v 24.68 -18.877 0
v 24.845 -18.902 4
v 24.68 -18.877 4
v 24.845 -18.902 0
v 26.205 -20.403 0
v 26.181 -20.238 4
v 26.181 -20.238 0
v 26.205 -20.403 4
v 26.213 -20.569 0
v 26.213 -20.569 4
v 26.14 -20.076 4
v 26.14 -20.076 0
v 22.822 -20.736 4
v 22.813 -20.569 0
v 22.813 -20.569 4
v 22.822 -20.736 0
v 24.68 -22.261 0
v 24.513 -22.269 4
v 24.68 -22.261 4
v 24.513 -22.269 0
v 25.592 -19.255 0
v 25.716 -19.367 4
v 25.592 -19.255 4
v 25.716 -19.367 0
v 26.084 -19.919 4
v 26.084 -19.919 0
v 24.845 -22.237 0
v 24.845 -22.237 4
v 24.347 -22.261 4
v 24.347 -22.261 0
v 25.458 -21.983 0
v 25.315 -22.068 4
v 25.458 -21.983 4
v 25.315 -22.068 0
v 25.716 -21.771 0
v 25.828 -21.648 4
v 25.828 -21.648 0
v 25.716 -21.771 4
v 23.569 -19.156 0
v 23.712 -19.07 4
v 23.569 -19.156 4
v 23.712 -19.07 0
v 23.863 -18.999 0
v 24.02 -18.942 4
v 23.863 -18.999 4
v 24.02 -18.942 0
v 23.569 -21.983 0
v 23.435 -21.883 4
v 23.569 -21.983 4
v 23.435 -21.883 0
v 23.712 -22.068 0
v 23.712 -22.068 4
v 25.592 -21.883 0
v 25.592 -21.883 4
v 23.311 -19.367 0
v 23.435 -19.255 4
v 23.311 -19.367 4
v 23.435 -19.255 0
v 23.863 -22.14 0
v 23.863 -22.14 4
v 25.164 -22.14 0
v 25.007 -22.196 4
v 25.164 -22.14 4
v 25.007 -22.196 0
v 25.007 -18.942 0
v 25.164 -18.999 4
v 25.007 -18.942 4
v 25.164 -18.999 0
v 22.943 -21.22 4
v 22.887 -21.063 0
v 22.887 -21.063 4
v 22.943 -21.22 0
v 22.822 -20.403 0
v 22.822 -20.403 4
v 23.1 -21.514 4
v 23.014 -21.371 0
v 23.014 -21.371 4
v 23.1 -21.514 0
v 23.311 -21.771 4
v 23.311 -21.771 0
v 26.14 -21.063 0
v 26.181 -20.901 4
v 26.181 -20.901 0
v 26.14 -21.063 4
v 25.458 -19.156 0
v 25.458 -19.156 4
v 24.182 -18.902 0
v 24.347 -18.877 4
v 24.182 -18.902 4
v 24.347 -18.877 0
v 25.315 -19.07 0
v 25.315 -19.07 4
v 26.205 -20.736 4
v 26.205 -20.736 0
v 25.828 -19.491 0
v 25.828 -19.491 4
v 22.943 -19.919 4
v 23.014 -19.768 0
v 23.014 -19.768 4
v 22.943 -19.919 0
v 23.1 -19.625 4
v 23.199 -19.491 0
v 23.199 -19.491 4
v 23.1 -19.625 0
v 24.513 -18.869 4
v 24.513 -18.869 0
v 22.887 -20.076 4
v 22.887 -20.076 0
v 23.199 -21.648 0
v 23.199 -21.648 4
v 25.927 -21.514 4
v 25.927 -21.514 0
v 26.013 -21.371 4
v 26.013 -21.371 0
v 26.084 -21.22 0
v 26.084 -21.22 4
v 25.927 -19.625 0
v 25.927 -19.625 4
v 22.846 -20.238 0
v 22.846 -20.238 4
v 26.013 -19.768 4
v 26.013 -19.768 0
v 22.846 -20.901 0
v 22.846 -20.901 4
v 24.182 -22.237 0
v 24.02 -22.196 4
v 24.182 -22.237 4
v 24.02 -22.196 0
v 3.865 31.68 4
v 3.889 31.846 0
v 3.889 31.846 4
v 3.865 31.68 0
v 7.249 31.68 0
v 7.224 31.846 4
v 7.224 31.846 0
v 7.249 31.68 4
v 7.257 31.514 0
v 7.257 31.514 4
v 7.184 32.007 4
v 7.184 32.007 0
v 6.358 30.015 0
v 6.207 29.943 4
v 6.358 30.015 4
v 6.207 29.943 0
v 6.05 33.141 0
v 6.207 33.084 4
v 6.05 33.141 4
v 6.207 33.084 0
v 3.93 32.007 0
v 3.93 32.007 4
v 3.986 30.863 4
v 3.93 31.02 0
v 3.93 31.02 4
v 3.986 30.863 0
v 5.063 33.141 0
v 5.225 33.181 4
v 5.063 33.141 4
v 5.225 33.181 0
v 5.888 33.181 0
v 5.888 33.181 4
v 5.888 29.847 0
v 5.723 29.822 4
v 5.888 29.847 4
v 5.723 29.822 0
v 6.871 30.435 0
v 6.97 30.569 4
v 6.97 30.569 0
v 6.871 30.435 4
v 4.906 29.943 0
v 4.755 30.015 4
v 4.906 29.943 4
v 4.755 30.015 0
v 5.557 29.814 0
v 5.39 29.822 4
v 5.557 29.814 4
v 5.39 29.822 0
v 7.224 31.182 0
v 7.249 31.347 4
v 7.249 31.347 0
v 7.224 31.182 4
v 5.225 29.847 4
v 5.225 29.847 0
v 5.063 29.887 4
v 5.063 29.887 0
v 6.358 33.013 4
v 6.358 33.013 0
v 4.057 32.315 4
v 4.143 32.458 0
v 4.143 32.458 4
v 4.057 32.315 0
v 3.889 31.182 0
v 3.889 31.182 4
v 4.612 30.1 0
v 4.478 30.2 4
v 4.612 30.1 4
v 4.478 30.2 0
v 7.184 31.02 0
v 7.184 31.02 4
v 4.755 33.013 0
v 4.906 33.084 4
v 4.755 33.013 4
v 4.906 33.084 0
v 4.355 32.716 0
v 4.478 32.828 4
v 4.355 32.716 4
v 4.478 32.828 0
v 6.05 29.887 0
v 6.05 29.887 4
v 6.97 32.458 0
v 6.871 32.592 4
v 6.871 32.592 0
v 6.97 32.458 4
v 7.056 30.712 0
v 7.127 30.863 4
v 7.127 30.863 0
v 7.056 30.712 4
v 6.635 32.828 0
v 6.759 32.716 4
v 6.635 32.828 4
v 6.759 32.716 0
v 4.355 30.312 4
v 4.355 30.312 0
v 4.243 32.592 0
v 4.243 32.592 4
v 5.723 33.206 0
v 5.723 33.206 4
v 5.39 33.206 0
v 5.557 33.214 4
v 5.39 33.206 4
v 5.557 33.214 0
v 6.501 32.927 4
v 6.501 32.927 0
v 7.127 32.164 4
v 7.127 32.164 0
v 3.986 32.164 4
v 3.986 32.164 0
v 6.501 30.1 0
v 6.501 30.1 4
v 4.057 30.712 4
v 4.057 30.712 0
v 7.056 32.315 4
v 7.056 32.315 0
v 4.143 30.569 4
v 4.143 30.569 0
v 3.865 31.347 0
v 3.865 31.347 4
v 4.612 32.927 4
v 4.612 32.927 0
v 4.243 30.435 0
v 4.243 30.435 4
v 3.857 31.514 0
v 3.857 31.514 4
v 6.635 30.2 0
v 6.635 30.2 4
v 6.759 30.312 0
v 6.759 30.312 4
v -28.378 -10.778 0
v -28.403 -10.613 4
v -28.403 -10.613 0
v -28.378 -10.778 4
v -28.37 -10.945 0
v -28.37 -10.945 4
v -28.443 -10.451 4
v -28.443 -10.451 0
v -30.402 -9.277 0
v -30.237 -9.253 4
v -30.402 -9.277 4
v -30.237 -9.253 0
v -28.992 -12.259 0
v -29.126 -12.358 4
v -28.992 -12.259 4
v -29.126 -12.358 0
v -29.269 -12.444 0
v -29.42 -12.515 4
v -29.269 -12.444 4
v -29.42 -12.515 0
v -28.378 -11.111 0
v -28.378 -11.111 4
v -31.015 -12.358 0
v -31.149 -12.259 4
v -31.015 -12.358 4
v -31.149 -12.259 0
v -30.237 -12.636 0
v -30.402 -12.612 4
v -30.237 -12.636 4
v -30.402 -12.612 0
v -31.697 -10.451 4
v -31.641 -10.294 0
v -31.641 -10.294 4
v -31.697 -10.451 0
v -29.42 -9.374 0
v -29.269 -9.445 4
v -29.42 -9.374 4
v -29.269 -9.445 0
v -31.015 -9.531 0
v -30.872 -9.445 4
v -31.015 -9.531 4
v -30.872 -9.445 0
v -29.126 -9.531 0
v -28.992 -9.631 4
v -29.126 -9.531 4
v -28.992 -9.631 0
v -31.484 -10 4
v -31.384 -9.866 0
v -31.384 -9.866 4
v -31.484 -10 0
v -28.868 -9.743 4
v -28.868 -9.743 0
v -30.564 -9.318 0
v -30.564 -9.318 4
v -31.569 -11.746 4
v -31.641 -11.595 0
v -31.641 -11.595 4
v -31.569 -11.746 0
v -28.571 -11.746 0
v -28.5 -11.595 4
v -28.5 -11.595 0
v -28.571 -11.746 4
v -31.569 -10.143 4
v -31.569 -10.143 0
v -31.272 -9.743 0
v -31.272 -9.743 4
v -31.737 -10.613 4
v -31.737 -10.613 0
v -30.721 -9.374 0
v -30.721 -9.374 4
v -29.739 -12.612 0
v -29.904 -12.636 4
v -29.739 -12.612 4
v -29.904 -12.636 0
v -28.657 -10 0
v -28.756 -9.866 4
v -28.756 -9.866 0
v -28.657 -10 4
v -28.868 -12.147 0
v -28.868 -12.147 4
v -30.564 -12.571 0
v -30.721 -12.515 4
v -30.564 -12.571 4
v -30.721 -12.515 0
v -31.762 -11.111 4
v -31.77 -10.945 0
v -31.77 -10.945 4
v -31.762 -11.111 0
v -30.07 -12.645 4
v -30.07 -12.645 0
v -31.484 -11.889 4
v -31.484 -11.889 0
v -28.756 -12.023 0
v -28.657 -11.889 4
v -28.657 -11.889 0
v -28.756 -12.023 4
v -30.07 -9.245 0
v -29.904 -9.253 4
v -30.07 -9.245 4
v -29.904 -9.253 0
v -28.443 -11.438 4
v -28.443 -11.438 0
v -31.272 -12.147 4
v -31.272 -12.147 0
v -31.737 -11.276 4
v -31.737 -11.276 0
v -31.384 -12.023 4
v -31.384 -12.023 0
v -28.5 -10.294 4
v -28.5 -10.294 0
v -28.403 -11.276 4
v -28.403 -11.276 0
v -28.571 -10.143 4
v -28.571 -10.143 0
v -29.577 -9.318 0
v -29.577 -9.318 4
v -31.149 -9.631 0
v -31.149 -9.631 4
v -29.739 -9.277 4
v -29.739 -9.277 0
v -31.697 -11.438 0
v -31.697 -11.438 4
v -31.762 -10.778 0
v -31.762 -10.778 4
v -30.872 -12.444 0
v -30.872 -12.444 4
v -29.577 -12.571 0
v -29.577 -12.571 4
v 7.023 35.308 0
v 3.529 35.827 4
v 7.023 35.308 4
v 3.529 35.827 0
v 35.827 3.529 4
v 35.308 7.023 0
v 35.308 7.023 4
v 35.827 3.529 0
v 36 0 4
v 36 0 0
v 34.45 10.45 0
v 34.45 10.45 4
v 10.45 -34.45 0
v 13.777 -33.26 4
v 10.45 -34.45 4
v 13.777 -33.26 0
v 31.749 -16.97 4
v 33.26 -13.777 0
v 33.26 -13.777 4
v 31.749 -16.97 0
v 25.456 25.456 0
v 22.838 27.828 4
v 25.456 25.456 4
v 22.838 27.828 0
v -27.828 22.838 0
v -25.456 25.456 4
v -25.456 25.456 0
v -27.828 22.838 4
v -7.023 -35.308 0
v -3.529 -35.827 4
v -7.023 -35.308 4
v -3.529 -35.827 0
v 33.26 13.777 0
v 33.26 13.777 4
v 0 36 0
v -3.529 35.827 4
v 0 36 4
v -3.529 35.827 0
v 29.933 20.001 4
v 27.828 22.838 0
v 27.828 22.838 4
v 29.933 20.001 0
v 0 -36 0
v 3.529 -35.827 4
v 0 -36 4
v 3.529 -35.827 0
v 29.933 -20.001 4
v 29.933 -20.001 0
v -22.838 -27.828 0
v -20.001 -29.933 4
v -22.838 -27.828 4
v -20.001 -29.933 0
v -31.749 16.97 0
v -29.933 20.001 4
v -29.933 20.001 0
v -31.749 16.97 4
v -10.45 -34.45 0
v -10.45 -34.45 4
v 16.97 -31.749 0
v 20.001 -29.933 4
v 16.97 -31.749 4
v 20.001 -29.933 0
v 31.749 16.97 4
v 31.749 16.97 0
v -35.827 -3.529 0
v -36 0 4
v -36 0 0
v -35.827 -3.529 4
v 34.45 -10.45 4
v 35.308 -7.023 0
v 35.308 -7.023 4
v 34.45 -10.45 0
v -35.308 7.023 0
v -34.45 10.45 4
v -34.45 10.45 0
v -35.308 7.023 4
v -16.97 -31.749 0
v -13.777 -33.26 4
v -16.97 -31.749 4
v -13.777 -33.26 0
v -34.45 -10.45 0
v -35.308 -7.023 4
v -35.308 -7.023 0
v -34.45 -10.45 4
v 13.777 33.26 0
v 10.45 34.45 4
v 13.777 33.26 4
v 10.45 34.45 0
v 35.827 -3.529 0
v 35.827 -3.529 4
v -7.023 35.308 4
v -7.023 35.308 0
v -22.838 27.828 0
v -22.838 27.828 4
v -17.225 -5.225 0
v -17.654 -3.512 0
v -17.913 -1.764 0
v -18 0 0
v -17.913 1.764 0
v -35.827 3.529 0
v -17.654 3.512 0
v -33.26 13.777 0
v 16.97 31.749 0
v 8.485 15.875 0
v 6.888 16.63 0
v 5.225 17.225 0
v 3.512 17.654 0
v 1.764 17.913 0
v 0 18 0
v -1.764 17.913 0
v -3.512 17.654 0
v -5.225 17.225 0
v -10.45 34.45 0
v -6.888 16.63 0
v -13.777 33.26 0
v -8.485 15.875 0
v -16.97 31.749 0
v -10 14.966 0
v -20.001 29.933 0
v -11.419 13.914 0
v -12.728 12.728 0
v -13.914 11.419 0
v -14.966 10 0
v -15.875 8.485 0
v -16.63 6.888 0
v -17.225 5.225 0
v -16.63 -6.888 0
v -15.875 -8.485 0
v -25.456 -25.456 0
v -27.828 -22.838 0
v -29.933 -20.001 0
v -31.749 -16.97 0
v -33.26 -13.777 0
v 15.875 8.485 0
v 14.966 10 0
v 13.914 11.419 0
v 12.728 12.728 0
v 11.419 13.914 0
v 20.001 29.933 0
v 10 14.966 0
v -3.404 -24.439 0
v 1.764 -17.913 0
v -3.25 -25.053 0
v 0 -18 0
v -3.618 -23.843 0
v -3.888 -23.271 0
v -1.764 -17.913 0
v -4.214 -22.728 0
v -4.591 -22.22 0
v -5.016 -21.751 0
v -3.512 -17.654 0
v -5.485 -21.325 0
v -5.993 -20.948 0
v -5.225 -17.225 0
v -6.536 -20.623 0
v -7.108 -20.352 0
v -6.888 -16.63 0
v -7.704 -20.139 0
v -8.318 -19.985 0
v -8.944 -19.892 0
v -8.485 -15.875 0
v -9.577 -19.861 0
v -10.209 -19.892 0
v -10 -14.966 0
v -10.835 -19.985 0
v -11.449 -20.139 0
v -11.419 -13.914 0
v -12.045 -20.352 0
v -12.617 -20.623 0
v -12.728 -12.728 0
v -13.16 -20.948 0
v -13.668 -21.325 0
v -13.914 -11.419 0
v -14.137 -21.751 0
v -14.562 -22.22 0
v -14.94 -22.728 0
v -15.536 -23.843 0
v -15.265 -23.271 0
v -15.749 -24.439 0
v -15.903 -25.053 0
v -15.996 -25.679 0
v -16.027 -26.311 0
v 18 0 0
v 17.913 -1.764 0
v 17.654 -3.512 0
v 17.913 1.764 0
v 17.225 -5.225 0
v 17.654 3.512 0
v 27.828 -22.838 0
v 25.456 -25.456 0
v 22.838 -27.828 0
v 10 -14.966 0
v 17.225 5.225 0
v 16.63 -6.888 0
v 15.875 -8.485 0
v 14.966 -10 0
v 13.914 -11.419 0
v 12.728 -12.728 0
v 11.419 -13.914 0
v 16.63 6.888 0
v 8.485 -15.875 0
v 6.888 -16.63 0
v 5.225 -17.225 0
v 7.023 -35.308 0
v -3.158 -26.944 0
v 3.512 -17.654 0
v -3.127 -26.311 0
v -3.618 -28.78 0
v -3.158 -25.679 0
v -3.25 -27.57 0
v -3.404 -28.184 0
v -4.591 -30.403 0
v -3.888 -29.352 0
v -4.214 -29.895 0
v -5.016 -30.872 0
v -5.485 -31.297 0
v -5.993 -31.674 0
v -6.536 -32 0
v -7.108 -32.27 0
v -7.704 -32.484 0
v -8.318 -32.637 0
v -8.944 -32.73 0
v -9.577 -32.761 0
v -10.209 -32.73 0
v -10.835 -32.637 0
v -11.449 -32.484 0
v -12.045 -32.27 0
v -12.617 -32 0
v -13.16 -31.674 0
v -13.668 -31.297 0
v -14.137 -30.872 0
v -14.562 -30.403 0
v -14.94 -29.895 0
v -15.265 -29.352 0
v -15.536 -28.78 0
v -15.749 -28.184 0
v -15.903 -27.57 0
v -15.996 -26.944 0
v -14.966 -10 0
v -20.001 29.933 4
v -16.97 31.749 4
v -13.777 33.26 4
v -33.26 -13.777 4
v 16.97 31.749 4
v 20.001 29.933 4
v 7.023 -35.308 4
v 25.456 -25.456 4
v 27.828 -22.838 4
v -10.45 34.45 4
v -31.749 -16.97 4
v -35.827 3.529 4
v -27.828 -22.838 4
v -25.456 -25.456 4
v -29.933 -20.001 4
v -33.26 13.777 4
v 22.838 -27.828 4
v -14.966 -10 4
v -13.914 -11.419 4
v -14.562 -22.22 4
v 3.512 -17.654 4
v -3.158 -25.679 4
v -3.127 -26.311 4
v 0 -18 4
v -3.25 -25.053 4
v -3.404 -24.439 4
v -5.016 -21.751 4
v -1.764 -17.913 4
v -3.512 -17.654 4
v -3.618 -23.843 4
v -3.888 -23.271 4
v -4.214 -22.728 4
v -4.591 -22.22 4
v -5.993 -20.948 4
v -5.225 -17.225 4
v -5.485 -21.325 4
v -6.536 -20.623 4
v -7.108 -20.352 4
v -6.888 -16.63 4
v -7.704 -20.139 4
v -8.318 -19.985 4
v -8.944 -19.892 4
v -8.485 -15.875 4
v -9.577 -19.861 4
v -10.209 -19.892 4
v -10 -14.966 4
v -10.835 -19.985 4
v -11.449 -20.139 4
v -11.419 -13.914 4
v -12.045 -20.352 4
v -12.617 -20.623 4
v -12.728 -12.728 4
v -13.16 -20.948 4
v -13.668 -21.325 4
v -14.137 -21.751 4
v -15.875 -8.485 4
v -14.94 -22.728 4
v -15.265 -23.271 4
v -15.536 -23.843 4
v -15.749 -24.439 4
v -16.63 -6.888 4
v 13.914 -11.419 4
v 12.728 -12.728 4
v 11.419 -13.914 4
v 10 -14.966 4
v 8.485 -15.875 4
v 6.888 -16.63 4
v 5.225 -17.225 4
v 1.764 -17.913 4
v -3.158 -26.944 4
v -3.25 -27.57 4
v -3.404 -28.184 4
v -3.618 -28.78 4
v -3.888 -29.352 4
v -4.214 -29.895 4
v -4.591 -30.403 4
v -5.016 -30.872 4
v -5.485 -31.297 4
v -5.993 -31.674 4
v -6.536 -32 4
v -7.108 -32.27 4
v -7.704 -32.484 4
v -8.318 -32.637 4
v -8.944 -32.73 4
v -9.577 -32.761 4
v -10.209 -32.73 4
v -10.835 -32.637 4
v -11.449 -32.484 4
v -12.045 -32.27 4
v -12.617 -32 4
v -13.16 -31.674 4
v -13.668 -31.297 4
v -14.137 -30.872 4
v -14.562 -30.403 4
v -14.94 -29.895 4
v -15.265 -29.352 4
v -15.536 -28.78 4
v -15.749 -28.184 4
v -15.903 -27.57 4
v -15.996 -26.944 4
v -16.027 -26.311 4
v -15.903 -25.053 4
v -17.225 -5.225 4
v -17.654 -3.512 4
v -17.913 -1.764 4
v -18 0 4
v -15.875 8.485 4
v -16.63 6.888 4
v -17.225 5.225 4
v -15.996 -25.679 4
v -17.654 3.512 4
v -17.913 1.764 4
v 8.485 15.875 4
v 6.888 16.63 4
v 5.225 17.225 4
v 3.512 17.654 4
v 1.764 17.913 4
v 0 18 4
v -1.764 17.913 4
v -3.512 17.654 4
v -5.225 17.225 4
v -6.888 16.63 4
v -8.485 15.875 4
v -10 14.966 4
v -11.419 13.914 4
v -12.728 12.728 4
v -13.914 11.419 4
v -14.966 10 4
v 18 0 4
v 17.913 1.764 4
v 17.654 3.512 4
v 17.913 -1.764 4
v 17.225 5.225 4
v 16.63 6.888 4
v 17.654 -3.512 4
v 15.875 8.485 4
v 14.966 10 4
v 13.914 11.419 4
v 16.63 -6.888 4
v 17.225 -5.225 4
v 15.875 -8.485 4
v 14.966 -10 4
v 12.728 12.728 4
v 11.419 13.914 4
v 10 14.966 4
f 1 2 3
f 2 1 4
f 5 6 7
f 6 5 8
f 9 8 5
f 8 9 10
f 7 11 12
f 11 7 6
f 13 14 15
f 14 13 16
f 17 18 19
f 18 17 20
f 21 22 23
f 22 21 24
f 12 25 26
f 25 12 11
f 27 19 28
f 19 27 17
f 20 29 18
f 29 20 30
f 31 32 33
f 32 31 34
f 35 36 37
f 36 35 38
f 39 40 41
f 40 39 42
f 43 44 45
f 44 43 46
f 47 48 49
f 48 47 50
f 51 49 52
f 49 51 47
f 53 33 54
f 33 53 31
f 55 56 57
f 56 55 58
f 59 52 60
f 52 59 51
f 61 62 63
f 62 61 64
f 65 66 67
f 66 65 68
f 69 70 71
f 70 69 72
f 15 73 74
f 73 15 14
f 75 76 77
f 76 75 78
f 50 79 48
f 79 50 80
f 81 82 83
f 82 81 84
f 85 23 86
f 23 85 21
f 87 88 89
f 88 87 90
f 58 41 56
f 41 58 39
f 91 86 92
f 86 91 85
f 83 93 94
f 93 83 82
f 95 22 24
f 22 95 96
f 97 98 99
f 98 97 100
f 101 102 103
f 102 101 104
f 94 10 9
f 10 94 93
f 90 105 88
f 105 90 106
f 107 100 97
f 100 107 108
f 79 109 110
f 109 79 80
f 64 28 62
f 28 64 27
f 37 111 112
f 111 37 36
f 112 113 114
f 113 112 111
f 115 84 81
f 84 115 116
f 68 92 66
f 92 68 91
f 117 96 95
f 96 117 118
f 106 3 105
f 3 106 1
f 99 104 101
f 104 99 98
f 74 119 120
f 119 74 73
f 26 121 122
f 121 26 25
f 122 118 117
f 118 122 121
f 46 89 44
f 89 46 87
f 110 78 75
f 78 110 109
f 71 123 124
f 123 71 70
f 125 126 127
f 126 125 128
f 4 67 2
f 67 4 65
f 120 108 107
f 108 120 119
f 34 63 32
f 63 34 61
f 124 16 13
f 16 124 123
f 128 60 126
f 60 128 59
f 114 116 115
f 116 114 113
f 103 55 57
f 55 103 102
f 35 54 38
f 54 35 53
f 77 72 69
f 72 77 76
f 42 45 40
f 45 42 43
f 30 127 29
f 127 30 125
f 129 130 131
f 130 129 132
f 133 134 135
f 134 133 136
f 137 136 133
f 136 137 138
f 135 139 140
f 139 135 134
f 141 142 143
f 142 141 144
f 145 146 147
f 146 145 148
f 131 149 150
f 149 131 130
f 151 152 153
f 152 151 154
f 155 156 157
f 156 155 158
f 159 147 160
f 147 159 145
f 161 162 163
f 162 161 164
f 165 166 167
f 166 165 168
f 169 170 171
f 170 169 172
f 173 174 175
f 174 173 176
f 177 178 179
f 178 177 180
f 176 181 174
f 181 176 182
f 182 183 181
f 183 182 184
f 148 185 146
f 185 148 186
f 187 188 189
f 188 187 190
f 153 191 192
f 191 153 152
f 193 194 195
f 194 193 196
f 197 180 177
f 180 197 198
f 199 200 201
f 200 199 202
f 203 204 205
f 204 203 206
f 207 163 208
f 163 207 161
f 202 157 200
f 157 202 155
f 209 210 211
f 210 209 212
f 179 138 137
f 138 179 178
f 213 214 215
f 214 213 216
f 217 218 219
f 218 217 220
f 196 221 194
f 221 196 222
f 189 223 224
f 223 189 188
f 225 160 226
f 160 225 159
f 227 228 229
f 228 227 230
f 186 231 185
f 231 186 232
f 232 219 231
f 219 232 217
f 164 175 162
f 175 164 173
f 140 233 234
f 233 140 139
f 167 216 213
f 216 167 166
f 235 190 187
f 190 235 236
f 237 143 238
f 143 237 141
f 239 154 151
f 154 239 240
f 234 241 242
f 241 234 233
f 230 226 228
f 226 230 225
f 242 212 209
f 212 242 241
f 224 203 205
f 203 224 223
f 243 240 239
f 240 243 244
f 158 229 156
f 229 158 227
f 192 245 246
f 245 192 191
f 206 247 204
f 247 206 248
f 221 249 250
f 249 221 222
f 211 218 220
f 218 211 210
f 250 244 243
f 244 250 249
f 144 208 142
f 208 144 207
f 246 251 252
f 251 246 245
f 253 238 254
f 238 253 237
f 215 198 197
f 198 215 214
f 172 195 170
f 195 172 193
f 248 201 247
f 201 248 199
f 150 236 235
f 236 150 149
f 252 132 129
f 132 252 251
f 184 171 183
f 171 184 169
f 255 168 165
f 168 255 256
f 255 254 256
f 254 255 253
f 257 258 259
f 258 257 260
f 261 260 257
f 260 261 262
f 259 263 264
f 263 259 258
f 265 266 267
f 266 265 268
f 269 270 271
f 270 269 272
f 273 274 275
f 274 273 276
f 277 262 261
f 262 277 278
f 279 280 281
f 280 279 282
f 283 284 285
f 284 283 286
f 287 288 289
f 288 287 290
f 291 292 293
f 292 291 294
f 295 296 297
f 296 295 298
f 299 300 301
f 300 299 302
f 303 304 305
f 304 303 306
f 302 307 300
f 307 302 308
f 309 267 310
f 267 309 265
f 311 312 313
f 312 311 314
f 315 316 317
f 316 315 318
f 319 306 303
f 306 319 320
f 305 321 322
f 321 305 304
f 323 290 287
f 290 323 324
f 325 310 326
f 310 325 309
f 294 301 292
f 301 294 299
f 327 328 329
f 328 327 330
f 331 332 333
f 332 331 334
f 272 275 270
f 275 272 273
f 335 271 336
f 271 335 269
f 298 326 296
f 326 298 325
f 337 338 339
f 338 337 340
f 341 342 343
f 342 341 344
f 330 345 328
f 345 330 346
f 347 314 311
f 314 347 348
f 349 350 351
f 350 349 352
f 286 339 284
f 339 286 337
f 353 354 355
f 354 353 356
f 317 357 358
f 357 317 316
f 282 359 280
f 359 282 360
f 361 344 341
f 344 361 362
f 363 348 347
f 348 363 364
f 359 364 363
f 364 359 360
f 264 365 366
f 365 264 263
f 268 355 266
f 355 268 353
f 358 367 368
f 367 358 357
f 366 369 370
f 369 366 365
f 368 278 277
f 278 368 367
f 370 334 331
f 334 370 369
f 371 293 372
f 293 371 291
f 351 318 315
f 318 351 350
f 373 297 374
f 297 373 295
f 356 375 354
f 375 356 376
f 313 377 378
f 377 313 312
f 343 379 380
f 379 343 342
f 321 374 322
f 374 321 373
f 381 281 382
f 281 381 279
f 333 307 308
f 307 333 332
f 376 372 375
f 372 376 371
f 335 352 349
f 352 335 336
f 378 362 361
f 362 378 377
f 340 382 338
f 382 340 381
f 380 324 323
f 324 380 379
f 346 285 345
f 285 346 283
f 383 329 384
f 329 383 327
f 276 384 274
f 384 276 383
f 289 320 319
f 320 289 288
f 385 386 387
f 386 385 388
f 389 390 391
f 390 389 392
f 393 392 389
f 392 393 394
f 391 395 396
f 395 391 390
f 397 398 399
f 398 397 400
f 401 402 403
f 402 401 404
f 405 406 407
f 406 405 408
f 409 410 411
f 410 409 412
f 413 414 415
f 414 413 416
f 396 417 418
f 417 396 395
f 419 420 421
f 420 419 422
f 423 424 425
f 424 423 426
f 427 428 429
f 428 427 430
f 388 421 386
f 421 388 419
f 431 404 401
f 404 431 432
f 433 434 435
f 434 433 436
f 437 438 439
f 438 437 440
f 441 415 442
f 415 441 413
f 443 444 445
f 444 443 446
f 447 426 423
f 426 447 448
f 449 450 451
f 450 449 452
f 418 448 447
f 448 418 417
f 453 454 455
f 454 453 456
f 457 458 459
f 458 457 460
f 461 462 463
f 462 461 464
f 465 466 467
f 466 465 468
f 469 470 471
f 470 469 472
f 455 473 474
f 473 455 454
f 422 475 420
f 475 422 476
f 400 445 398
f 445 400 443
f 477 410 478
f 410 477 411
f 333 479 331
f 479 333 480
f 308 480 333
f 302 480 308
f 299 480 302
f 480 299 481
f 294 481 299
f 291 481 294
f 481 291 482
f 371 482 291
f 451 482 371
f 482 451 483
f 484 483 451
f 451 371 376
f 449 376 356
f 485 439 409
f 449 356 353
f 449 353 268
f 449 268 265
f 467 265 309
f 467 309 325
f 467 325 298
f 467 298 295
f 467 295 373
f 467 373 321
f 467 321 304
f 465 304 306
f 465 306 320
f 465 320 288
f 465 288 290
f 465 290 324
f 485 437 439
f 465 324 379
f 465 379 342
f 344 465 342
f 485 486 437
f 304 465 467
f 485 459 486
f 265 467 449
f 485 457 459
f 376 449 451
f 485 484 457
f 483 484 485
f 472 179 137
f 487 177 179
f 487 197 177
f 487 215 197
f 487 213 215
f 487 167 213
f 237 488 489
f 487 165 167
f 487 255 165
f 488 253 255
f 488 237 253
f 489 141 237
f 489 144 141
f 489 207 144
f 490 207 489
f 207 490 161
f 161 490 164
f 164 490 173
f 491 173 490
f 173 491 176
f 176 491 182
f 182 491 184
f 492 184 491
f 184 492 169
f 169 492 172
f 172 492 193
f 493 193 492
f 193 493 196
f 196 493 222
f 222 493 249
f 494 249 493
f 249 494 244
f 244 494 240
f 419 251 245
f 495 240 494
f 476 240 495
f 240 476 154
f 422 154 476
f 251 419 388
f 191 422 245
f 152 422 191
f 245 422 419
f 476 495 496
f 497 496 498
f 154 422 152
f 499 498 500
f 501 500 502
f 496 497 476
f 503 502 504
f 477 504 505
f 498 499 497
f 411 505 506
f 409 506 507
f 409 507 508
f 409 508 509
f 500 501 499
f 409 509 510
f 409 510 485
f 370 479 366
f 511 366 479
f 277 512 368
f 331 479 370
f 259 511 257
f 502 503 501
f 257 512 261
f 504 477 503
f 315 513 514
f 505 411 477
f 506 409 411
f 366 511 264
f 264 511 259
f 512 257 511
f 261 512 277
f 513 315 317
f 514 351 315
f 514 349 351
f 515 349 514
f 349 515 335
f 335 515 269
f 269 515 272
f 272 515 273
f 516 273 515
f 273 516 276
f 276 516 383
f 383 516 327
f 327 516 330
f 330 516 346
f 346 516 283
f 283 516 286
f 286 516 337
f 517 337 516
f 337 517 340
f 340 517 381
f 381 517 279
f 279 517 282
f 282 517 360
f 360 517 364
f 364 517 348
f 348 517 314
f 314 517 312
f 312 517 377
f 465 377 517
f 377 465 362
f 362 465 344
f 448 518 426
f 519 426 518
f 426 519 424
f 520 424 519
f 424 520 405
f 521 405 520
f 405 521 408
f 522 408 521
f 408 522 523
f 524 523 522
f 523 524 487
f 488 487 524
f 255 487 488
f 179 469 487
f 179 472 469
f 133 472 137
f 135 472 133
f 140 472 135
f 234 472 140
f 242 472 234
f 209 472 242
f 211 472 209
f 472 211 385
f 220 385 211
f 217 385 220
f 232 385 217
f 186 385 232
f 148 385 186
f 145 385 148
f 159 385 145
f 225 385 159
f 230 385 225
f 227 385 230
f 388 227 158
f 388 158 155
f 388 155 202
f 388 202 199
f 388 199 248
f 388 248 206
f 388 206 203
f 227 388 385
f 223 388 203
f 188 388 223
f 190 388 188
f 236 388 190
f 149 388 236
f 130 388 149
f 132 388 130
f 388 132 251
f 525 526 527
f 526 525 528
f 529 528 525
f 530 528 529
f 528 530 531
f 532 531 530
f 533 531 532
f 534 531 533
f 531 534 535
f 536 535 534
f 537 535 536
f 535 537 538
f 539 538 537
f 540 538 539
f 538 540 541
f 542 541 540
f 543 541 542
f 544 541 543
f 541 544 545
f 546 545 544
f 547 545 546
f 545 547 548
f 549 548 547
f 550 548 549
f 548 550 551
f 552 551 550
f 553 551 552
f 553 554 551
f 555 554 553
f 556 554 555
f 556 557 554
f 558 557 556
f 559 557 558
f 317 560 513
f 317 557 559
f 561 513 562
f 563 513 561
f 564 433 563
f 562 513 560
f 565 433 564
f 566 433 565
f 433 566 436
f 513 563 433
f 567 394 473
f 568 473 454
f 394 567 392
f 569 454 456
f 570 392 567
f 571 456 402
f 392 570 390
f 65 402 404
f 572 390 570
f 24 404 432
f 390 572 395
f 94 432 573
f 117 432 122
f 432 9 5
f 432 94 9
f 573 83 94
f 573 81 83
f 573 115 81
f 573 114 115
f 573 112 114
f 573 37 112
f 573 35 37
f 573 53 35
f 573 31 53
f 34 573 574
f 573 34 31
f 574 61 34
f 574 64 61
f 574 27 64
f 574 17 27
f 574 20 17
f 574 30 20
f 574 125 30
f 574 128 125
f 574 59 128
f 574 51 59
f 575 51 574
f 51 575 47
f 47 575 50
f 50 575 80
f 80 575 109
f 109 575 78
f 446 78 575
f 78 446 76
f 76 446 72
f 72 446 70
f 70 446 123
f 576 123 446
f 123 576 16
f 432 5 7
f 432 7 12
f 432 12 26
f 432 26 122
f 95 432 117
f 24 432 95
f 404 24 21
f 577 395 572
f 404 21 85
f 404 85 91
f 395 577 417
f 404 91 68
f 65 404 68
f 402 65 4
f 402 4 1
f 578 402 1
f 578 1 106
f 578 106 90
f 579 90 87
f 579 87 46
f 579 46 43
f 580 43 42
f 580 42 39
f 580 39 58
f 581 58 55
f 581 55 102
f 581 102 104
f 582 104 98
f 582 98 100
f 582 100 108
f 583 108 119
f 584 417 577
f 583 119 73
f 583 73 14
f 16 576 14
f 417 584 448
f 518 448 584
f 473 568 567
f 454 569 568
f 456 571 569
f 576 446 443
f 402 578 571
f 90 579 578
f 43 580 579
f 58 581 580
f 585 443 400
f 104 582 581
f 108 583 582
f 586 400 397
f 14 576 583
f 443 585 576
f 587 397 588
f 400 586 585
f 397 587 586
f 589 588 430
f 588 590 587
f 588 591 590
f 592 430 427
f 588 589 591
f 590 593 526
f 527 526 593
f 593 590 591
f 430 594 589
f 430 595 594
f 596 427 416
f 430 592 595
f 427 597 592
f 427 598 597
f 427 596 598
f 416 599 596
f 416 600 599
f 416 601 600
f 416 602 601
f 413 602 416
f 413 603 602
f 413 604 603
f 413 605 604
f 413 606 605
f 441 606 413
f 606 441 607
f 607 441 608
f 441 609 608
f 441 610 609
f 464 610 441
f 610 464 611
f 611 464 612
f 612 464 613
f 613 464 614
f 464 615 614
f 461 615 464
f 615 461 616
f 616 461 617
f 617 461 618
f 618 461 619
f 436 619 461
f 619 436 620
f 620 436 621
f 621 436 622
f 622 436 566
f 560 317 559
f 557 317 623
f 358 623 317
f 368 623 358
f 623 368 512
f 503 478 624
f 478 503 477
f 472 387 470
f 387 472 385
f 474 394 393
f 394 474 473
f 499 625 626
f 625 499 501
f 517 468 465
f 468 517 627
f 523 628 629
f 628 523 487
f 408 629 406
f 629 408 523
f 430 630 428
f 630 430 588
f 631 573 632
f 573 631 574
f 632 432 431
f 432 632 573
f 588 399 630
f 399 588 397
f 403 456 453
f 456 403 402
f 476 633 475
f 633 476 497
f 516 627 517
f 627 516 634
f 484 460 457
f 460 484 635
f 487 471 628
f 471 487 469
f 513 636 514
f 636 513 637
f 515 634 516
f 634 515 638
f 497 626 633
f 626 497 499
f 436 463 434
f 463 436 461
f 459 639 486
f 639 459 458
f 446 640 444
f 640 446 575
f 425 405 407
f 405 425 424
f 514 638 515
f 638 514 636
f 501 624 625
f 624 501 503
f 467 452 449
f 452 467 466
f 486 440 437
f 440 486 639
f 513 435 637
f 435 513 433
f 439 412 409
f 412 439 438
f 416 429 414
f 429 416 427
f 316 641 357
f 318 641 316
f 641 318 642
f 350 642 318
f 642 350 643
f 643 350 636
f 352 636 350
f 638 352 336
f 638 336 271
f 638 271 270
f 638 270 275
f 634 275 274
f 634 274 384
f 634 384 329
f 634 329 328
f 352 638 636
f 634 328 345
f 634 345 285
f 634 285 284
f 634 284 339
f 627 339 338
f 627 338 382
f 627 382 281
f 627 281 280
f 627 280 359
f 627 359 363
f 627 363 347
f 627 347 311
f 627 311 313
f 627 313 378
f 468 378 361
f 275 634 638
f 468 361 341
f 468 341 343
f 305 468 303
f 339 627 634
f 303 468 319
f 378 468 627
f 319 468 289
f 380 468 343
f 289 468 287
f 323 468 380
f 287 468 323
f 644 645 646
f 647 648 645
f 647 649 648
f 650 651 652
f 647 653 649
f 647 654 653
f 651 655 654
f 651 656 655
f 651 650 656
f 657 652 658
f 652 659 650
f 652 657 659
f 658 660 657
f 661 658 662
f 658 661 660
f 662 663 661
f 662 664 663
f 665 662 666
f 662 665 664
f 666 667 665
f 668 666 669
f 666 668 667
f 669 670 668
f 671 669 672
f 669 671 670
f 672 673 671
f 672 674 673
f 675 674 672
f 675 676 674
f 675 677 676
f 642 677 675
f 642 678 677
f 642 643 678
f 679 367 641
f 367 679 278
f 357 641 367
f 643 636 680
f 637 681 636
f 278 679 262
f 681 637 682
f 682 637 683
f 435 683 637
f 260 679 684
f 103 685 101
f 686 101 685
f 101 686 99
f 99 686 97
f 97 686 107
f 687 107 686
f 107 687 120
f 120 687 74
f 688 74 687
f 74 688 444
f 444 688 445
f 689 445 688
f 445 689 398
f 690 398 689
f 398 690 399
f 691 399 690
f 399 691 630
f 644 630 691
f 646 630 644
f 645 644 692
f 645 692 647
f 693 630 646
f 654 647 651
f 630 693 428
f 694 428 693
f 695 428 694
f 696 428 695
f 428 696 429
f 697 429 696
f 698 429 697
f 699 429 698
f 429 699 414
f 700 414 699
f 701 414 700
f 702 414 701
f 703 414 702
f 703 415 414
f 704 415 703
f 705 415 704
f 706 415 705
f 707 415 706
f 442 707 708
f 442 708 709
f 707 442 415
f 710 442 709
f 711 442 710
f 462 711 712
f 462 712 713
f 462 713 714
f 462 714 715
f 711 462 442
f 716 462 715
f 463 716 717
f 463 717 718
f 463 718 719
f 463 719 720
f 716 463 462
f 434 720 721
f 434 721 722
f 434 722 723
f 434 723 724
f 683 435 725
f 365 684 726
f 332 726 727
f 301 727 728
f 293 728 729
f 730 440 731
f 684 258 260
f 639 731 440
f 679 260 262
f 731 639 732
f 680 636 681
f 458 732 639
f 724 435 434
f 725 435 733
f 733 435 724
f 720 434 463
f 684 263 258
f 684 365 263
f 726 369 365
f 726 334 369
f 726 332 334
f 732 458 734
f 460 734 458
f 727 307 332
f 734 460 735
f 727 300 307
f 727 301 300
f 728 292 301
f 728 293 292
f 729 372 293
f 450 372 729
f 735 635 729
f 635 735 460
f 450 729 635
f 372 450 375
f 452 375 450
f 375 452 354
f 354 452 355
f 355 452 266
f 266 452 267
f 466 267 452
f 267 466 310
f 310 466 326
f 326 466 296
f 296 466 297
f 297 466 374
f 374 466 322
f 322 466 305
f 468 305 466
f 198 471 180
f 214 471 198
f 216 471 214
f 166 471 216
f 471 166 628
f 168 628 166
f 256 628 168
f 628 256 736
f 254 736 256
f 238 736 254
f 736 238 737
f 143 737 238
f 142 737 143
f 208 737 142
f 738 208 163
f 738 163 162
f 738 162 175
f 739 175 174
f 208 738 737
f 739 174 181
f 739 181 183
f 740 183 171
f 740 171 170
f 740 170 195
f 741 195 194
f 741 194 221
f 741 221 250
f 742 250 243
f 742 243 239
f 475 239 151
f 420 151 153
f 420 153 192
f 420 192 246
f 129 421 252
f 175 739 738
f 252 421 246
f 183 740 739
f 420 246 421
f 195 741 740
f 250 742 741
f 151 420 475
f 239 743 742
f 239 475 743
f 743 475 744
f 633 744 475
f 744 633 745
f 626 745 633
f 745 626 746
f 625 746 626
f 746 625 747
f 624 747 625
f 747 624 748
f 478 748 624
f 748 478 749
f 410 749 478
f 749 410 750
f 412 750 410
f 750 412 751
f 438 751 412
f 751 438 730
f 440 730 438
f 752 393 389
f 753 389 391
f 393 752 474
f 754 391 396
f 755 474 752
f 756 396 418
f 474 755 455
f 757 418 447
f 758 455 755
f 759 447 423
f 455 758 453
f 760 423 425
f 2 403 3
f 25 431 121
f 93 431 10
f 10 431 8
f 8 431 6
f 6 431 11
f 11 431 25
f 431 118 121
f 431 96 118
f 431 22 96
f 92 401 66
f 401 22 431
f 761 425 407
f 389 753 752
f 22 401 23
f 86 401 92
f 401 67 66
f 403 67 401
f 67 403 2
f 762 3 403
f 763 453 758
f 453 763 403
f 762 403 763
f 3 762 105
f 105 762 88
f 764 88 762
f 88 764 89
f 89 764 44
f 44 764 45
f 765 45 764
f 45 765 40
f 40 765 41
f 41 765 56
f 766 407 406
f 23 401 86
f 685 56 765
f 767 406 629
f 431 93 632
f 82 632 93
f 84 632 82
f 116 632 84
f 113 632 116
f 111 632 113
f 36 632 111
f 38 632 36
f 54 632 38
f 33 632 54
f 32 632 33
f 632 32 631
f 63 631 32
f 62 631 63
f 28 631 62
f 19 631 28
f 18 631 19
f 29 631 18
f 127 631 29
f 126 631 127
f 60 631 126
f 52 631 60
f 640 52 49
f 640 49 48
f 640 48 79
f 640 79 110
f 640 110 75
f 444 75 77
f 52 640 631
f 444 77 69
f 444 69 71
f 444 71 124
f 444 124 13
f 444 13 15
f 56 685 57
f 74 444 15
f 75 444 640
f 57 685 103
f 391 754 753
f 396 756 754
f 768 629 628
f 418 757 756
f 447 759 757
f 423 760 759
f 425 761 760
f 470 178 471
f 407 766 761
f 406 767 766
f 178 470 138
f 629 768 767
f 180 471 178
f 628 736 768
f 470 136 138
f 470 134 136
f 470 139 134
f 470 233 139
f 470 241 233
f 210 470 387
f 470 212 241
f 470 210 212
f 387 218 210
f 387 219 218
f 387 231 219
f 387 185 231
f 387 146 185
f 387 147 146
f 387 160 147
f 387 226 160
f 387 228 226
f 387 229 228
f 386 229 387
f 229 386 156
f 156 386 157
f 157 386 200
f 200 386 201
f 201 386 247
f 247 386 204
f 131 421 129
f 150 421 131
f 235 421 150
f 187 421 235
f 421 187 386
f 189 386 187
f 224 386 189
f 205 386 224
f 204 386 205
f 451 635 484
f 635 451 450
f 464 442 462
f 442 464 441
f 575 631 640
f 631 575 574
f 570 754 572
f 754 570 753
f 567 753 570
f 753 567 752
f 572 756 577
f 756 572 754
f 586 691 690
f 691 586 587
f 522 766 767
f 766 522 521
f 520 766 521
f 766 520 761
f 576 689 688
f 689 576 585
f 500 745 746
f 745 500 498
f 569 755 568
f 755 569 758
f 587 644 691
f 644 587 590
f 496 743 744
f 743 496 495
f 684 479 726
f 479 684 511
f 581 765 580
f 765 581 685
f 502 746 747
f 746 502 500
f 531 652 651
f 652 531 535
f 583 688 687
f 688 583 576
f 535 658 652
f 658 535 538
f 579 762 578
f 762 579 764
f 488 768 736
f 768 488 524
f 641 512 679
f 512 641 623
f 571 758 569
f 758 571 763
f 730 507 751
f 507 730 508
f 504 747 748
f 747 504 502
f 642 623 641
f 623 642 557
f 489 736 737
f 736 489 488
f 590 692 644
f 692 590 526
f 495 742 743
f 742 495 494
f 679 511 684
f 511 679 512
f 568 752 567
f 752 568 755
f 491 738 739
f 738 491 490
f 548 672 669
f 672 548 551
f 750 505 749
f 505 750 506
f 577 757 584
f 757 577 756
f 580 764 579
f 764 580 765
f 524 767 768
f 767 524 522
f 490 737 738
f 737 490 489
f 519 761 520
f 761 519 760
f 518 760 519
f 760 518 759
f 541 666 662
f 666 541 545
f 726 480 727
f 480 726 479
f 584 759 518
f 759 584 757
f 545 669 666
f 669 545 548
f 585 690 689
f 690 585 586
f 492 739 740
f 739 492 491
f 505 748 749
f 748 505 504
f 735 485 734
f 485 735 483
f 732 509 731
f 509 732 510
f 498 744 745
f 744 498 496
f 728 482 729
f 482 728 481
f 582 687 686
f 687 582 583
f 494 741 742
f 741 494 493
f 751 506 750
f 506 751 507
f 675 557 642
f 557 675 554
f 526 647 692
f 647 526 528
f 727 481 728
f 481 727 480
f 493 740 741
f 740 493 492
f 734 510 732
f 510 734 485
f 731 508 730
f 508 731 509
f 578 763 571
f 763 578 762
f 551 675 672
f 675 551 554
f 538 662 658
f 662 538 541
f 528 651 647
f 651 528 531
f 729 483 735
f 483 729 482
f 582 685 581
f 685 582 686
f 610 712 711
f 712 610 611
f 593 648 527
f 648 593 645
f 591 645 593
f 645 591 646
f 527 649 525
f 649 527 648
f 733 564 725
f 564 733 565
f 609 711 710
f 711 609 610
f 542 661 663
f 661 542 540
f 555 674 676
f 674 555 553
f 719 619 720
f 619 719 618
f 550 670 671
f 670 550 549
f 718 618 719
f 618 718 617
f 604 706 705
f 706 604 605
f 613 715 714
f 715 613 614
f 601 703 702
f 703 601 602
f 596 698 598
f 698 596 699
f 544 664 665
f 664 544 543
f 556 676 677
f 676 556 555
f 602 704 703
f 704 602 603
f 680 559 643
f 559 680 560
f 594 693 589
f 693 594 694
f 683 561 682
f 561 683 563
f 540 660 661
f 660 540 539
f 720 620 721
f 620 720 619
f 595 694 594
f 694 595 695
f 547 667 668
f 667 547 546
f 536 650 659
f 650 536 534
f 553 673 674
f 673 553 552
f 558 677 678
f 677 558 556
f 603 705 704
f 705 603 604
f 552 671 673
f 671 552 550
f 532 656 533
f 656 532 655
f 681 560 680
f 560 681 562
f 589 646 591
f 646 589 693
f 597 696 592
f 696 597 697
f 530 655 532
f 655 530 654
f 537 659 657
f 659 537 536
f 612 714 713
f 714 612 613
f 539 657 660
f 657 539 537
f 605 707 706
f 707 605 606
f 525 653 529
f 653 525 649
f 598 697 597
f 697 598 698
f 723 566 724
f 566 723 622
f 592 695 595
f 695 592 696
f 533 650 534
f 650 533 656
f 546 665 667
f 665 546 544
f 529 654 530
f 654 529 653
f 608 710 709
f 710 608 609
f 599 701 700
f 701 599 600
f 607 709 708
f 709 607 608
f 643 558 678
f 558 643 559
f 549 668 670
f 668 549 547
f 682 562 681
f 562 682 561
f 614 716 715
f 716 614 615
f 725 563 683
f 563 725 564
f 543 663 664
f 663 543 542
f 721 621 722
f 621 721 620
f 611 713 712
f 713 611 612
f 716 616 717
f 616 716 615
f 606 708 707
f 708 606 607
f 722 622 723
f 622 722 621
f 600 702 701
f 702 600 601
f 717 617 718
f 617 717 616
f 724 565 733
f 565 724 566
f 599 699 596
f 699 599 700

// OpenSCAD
// file: ../lib/shapes.scad
// Small reusable helper modules shared across the feeder parts.
// Include dimensions.scad before this if a module needs one of its constants
// (none currently do -- these are pure geometry helpers).

// 2D profile of a D-shaft: a circle of diameter `d` with a flat cut `flat_depth`
// in from the edge. Extrude this to cut a D-shaft hole, or use it solid to
// model the shaft itself for a fit check.
module dshaft_2d(d, flat_depth) {
    r = d / 2;
    intersection() {
        circle(d = d);
        translate([-r - 1, -(r - flat_depth), 0])
            square([2 * r + 2, 2 * r + 2]);
    }
}

// 3D D-shaft hole, centered on the Z axis, extruded along Z, centered in Z.
module dshaft_hole(d, flat_depth, length) {
    linear_extrude(height = length, center = true)
        dshaft_2d(d, flat_depth);
}

// Places `count` copies of its children evenly around a circle of radius `r`,
// starting at `start_angle`. Each child is translated (not rotated) to its
// position -- use this for pins/magnet pockets that don't need to face inward.
module orbit(r, count, start_angle = 0) {
    for (i = [0 : count - 1]) {
        a = start_angle + i * 360 / count;
        translate([r * cos(a), r * sin(a), 0])
            children();
    }
}
// main file
// Stationary back plate -- the surface case bases ride on.
//
// This is the hopper's floor continued underneath the wheel. A case stands
// base-down on this plate; the hopper's converging walls slide it down to the
// outlet, where a rim scallop on the wheel captures it laterally. From there
// the case rides round with its base still sliding on this plate, until the
// scallop reaches the discharge hole and the case drops straight through.
//
// So this plate does the axial job (holding the case's base) while the
// wheel's rim scallop does the lateral job (carrying it round). Replaces the
// earlier face_plate.scad, which was built for a through-the-face pocket that
// turned out to be the wrong mechanism.
//
// The hub's pins/boss/magnets pass through the central clearance hole
// completely unblocked to reach the wheel on the other side.
//
// Coordinate convention: Z=0 is the FRONT face (the side the wheel runs
// against, separated by BACKPLATE_CLEARANCE_GAP). Z=BACKPLATE_THICKNESS is
// the BACK face, toward the hub and motor.
//
// Open this file directly in OpenSCAD to preview just the plate.

include <../lib/dimensions.scad>
include <../lib/shapes.scad>

MOUNT_HOLE_D           = 3.4;   // M3 clearance
MOUNT_HOLE_ORBIT_R     = BACKPLATE_OD/2 - 4;
MOUNT_HOLE_COUNT       = 3;
MOUNT_HOLE_START_ANGLE = DISCHARGE_ANGLE + 70;  // kept off the discharge hole

module back_plate() {
    difference() {
        cylinder(d = BACKPLATE_OD, h = BACKPLATE_THICKNESS);

        // Central clearance -- hub's pins/boss/magnets pass through untouched
        translate([0, 0, -1])
            cylinder(d = BACKPLATE_CENTER_CLEAR_D, h = BACKPLATE_THICKNESS + 2);

        // Discharge hole -- the one place a carried case is allowed through.
        // Sits on the scallop's orbit (the wheel's rim), so it straddles the
        // wheel's edge: half under the wheel, half outside it.
        translate([POCKET_ORBIT_R * cos(DISCHARGE_ANGLE),
                   POCKET_ORBIT_R * sin(DISCHARGE_ANGLE),
                   -1])
            cylinder(d = DISCHARGE_CUTOUT_D, h = BACKPLATE_THICKNESS + 2);

        // Mounting holes into the housing
        orbit(MOUNT_HOLE_ORBIT_R, MOUNT_HOLE_COUNT, MOUNT_HOLE_START_ANGLE)
            translate([0, 0, -1])
                cylinder(d = MOUNT_HOLE_D, h = BACKPLATE_THICKNESS + 2);
    }
}

back_plate();
